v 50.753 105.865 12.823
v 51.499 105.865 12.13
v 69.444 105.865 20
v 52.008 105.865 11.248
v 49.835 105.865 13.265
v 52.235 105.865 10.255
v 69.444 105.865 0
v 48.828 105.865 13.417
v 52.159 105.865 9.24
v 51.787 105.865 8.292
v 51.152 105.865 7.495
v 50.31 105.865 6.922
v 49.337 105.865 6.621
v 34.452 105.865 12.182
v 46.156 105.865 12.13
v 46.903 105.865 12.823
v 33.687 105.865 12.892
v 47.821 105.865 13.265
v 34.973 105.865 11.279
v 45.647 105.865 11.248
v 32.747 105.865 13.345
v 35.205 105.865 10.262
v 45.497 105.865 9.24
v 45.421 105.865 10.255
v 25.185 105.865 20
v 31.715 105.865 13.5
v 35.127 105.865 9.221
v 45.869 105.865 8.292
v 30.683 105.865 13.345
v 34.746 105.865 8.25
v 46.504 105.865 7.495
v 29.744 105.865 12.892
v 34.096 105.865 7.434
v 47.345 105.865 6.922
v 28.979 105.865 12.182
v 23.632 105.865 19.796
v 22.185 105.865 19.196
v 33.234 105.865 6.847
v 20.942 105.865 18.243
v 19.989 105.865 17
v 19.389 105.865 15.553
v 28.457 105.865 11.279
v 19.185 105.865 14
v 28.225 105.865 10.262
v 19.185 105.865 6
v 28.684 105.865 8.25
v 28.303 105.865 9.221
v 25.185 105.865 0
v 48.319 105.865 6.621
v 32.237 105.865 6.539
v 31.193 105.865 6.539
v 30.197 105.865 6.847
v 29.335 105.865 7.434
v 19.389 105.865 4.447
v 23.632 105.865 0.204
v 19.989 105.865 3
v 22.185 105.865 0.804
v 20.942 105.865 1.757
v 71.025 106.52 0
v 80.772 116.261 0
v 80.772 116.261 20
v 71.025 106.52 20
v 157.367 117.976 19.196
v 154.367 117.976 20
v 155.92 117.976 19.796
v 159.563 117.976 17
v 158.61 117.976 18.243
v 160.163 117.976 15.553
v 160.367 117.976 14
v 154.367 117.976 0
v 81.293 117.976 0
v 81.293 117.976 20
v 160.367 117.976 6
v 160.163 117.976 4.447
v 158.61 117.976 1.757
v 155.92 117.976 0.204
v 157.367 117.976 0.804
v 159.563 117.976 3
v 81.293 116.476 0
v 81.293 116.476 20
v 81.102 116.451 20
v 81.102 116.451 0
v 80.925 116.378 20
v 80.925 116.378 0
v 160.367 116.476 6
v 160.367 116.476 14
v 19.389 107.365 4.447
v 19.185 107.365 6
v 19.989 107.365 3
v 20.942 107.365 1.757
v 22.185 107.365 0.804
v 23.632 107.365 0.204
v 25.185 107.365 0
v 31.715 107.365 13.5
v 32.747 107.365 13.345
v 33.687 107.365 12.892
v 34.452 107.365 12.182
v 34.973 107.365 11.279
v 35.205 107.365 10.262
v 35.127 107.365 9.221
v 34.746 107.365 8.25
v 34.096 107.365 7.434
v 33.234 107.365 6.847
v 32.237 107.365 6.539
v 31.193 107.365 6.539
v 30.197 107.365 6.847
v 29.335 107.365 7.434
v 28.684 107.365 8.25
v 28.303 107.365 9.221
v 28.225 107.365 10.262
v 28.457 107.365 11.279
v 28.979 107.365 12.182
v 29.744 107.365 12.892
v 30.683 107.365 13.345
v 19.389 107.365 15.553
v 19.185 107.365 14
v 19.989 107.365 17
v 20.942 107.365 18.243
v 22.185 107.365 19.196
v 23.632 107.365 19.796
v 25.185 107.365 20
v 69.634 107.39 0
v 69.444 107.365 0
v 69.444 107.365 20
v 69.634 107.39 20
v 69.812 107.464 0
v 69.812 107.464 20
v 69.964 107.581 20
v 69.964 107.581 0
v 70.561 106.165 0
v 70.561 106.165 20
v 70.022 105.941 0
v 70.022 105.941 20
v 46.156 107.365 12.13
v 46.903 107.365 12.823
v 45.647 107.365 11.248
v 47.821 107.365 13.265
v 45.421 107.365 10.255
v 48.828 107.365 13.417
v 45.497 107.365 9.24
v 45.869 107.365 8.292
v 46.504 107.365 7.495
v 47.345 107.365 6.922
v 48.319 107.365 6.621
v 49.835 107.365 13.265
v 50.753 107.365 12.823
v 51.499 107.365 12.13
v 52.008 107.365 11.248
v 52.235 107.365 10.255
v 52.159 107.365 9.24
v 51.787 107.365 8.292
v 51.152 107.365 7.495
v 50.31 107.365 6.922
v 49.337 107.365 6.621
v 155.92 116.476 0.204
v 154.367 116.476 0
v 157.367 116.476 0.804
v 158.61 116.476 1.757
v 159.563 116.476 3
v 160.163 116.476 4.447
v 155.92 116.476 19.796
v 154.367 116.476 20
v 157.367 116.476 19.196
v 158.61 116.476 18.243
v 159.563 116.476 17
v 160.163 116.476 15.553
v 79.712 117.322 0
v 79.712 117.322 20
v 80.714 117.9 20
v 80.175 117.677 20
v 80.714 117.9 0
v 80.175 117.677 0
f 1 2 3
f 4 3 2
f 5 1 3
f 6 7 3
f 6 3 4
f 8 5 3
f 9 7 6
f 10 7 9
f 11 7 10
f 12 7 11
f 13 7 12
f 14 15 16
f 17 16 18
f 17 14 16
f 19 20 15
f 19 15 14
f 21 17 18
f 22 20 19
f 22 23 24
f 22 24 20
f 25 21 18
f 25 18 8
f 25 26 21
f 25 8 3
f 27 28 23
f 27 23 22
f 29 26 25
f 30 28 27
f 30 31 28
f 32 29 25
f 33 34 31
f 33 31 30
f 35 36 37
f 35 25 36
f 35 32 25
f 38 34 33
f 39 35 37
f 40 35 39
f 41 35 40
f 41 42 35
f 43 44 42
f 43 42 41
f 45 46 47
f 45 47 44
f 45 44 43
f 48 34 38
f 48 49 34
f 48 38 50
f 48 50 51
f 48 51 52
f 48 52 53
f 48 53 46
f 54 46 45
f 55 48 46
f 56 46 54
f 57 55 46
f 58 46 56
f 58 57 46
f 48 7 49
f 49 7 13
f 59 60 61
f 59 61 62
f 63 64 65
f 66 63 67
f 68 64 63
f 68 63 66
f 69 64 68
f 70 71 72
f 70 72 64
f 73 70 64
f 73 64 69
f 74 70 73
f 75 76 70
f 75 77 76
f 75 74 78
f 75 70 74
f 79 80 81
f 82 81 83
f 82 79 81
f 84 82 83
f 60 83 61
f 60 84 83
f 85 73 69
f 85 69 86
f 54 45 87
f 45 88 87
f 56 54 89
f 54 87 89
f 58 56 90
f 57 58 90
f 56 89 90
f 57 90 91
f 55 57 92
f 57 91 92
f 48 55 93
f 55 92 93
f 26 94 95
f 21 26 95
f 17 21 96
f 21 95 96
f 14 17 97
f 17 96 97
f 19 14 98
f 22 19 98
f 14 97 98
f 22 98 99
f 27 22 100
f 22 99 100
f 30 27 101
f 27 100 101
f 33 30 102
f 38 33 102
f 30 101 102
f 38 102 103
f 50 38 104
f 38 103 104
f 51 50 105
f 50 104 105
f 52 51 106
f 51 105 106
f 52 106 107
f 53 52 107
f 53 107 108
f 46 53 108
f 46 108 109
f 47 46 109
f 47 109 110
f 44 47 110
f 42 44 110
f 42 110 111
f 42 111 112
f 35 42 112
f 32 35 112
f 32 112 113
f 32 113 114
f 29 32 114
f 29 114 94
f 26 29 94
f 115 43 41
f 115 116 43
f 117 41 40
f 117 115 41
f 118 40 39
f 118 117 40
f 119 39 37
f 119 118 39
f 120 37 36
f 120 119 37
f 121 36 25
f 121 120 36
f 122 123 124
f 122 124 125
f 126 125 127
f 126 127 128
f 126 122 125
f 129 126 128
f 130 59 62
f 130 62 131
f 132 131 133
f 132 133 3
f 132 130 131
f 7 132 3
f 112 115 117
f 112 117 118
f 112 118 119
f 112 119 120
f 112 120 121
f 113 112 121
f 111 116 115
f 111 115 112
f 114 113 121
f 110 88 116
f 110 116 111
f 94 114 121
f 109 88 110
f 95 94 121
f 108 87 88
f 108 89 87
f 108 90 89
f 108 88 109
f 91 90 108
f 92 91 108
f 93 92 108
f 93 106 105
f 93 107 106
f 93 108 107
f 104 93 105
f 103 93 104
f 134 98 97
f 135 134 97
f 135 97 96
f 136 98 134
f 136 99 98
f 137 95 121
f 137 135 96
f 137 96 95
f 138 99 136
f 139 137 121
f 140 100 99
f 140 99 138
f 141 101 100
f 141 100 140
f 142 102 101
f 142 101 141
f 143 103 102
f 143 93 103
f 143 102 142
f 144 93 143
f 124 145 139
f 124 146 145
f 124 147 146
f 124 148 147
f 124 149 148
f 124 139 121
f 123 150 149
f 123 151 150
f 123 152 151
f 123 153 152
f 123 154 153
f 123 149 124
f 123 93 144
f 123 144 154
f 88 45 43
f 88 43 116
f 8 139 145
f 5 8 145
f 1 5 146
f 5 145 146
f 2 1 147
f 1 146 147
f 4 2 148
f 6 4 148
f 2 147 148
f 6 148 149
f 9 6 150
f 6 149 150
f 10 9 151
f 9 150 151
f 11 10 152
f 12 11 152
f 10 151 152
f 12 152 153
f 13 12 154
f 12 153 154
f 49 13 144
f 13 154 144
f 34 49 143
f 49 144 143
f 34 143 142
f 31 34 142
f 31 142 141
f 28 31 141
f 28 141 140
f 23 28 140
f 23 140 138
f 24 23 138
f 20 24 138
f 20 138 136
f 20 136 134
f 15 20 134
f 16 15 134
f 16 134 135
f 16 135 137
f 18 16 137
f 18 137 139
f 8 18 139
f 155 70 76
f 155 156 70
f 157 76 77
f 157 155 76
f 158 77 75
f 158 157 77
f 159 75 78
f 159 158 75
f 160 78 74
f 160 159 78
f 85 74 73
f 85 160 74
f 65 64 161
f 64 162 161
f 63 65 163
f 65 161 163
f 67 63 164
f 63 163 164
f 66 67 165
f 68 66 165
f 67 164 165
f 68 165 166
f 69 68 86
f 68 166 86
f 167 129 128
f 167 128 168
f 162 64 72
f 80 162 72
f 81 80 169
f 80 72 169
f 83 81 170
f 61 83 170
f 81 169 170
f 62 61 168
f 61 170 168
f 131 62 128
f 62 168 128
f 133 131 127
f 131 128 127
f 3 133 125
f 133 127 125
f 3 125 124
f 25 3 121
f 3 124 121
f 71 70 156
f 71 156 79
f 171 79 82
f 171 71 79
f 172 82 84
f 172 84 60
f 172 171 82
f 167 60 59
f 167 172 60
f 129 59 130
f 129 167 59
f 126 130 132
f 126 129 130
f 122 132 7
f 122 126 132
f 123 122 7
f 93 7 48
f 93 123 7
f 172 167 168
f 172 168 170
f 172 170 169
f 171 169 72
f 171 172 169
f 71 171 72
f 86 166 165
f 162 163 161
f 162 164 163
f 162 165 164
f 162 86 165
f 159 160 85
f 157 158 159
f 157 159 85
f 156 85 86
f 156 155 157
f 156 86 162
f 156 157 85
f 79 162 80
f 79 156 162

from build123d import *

# Parameters (mm, degrees)
BASE_FLANGE1_DEPTH = 20
SKETCH2_R          = 3.5
CUT_EXTRUDE1_DEPTH = 3
SKETCH3_R          = 3.41681183
CUT_EXTRUDE2_DEPTH = 3
FILLET1_R          = 6


# Sheet-metal steps are written as plain solids
with BuildPart() as part:
    # Sketch1 → Base-Flange1 (new body)
    with BuildSketch(Plane.XY):
        with BuildLine():
            Line((19.18483114, 107.365276831), (69.443546787, 107.365276831))
            ThreePointArc((69.443546787, 107.365276831), (69.725312696, 107.421298009), (69.964219908, 107.580840304))
            Line((69.964219908, 107.580840304), (79.71206519, 117.321886786))
            ThreePointArc((79.71206519, 117.321886786), (80.437479078, 117.806318361), (81.293028401, 117.976420136))
            Line((81.293028401, 117.976420136), (160.367055374, 117.976420136))
            Line((160.367055374, 117.976420136), (160.367055374, 116.476420136))
            Line((160.367055374, 116.476420136), (81.293028401, 116.476420136))
            ThreePointArc((81.293028401, 116.476420136), (81.011262492, 116.420398957), (80.772355281, 116.260856662))
            Line((80.772355281, 116.260856662), (71.024509998, 106.51981018))
            ThreePointArc((71.024509998, 106.51981018), (70.299096111, 106.035378605), (69.443546787, 105.865276831))
            Line((69.443546787, 105.865276831), (19.18483114, 105.865276831))
            Line((19.18483114, 105.865276831), (19.18483114, 107.365276831))
        make_face()
    extrude(amount=BASE_FLANGE1_DEPTH)

    # Sketch2 → Cut-Extrude1 (cut)
    with BuildSketch(Plane(origin=(0, 107.365276831, 0), x_dir=(1, 0, 0), z_dir=(0, 1, 0))):
        with Locations(Location((31.715129554, -10, 0), (0, 0, 270))):
            Circle(SKETCH2_R)
    extrude(amount=-CUT_EXTRUDE1_DEPTH, mode=Mode.SUBTRACT)

    # Sketch3 → Cut-Extrude2 (cut)
    with BuildSketch(Plane(origin=(0, 107.365276831, 0), x_dir=(1, 0, 0), z_dir=(0, 1, 0))):
        with Locations(Location((48.827870371, -10, 0), (0, 0, 270))):
            Circle(SKETCH3_R)
    extrude(amount=-CUT_EXTRUDE2_DEPTH, mode=Mode.SUBTRACT)

    # Fillet1
    fillet1_edges = [part.edges().sort_by_distance(p)[0] for p in [
        (19.18483114, 106.615276831, 0),
        (160.367055374, 117.226420136, 0),
        (19.18483114, 106.615276831, 20),
        (160.367055374, 117.226420136, 20),
    ]]
    fillet(fillet1_edges, radius=FILLET1_R)


solid = part.part
